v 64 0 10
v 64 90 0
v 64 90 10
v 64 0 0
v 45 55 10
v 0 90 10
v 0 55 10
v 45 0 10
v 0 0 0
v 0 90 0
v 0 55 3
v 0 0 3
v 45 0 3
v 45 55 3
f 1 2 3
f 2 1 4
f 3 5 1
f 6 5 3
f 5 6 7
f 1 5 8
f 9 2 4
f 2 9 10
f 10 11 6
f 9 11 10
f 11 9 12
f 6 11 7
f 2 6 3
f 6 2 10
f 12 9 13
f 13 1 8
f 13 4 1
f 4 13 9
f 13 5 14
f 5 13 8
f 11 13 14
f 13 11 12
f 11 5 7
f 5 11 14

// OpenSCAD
difference()
{
	cube ([64,90,10]);
	translate([0,0,3]) cube ([45,55,10]);
}
